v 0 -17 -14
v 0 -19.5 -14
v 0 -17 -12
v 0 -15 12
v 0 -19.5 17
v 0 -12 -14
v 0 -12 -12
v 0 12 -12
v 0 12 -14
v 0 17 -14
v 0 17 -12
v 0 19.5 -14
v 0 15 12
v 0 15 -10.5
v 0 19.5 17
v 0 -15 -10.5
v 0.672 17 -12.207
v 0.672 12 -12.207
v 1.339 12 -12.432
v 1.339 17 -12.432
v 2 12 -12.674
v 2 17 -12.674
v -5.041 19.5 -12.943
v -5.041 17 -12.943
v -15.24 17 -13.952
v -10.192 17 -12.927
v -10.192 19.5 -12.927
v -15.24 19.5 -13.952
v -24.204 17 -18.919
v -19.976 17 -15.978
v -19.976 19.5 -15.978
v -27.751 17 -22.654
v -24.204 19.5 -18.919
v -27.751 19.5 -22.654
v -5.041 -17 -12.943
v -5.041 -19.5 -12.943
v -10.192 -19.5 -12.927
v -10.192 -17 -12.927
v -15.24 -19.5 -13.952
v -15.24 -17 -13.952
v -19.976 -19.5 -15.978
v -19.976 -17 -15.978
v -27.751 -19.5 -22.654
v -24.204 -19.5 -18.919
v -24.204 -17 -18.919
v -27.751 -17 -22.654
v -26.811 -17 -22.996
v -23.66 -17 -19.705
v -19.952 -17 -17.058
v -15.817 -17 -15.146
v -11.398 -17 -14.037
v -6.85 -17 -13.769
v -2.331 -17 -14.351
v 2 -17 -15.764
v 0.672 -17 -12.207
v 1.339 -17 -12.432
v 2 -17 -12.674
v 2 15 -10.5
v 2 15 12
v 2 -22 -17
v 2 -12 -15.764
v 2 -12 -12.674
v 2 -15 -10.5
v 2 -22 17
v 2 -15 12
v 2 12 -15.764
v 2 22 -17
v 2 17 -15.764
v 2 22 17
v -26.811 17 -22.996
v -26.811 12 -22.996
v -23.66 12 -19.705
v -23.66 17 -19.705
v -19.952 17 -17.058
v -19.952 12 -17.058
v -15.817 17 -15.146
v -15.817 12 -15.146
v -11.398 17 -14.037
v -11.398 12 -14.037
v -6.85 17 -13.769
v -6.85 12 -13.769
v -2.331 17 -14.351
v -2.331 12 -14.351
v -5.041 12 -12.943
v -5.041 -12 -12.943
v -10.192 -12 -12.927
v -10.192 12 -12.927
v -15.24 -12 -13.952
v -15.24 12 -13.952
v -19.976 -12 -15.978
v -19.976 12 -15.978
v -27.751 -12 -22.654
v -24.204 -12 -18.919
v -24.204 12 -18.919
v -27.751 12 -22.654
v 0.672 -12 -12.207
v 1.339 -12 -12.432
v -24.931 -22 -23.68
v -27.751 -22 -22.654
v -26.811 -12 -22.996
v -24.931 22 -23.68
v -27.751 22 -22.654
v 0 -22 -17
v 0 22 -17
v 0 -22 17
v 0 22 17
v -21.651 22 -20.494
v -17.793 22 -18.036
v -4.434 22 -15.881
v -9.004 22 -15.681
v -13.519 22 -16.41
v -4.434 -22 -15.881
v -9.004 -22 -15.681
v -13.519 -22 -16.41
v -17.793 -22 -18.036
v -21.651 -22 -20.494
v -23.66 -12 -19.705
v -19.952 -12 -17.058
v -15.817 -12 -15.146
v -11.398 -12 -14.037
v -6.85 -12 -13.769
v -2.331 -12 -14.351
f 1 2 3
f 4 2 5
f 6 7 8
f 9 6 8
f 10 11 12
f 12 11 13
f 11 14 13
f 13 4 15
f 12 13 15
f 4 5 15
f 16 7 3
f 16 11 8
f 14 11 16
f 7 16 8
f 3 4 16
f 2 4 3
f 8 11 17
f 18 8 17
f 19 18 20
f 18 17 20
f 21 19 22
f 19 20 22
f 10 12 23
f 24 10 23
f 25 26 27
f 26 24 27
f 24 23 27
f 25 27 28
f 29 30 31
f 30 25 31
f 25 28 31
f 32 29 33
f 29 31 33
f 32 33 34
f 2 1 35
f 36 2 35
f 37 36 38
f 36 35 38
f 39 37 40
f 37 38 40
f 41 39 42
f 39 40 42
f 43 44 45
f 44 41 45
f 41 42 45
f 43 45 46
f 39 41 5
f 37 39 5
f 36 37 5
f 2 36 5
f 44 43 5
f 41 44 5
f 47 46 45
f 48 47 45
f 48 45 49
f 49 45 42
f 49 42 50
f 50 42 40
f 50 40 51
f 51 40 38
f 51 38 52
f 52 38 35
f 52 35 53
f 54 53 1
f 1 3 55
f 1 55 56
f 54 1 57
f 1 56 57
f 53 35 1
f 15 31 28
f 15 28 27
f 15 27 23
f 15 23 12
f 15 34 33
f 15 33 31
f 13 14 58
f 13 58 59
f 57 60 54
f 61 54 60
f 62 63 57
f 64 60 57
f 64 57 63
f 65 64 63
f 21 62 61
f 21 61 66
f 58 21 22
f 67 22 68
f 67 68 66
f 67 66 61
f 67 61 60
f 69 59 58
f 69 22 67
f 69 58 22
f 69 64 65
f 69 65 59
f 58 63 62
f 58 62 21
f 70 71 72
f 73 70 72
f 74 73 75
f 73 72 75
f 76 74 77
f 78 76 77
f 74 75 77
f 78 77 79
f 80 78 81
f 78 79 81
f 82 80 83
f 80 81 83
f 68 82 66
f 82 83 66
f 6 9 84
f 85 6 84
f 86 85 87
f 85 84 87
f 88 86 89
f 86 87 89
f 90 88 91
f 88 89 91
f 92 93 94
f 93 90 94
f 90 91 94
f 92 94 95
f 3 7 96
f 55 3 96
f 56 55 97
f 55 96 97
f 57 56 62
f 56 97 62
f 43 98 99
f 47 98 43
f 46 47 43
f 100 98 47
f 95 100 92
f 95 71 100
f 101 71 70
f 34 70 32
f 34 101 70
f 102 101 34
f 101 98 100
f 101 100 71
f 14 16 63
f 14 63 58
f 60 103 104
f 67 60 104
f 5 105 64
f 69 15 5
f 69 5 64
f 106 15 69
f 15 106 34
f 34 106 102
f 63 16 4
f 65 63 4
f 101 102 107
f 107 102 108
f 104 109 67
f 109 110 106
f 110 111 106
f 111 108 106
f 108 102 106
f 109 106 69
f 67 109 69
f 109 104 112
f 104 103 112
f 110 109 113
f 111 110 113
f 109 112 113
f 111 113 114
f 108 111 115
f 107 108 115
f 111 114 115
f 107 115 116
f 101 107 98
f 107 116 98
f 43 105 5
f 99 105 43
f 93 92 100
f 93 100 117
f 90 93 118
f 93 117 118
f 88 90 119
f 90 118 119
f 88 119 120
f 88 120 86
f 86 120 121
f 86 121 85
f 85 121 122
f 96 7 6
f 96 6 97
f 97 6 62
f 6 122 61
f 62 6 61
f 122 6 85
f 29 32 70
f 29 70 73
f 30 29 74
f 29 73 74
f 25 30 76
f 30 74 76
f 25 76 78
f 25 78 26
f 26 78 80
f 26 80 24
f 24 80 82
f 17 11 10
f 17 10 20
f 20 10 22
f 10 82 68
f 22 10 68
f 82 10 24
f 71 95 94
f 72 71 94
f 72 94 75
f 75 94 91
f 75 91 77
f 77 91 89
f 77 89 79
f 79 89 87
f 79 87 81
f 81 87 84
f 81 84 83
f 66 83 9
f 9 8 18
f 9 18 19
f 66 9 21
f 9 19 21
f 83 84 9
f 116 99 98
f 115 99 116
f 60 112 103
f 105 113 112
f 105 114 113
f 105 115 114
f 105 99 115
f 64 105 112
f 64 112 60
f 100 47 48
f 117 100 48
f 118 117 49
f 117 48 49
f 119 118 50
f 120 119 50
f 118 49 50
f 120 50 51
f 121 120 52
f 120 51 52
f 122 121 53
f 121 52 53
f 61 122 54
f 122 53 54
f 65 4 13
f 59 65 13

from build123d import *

# Parameters (mm, degrees)
F0_W     = 44
F0_H     = 34
F0_W_2   = 30
F0_H_2   = 22.5
F1_DEPTH = 2
F3_W     = 44
F3_H     = 3
F6_DEPTH = 2.5
F9_W     = 3
F9_H     = 5


with BuildPart() as f1:
    # F0 (on Right) → F1 (new body)
    with BuildSketch(Plane.YZ):
        Rectangle(F0_W, F0_H)
        with Locations((0, 0.75)):
            Rectangle(F0_W_2, F0_H_2, mode=Mode.SUBTRACT)
    extrude(amount=F1_DEPTH)

    # F4: sweep along a path in F2
    with BuildLine(Plane.XZ.offset(22)) as f4_path:
        ThreePointArc((0, -17), (-13.5188817396, -16.4097528762), (-24.931453195, -23.6803627497))
    # F3 (on face) → F4 (sweep)
    with BuildSketch(Plane(origin=(0, 0, 0), x_dir=(0, -1, 0), z_dir=(-1, 0, 0))):
        with Locations((0, -15.5)):
            Rectangle(F3_W, F3_H)
    sweep(path=f4_path.line)

    # F5 (on face) → F6 (join)
    with BuildSketch(Plane.XZ.offset(22)):
        with BuildLine():
            Line((0, -14), (0, 17))
            Line((0, 17), (-27.7505310574, -22.6543023198))
            ThreePointArc((-27.7505310574, -22.6543023198), (-15.2396110487, -13.9522967433), (0, -14))
        make_face()
    extrude(amount=-F6_DEPTH)


with BuildPart() as f7_1:
    # F7: instance of F1
    add(f1.part.mirror(Plane.XZ))


with BuildPart() as f1_1:
    add(f1.part)

    # F8: union F7_1
    add(f7_1.part)

    # F10: sweep along a path in F2
    with BuildLine(Plane.XZ.offset(22)) as f10_path:
        ThreePointArc((-24.931453195, -23.6803627497), (-10.8151434968, -15.8604105956), (4.9059770967, -19.5029671802))
    # F9 (on face) → F10 (sweep, cut)
    with BuildSketch(Plane(origin=(-10.5271478923, 0, -28.9231011252), x_dir=(0.9396926208, 0, -0.3420201433), z_dir=(-0.3420201433, 0, -0.9396926208))):
        with Locations((-18.8287415311, -14.5)):
            Rectangle(F9_W, F9_H)
        with Locations((-18.8287415311, 14.5)):
            Rectangle(F9_W, F9_H)
    sweep(path=f10_path.line, mode=Mode.SUBTRACT)


solid = f1_1.part
